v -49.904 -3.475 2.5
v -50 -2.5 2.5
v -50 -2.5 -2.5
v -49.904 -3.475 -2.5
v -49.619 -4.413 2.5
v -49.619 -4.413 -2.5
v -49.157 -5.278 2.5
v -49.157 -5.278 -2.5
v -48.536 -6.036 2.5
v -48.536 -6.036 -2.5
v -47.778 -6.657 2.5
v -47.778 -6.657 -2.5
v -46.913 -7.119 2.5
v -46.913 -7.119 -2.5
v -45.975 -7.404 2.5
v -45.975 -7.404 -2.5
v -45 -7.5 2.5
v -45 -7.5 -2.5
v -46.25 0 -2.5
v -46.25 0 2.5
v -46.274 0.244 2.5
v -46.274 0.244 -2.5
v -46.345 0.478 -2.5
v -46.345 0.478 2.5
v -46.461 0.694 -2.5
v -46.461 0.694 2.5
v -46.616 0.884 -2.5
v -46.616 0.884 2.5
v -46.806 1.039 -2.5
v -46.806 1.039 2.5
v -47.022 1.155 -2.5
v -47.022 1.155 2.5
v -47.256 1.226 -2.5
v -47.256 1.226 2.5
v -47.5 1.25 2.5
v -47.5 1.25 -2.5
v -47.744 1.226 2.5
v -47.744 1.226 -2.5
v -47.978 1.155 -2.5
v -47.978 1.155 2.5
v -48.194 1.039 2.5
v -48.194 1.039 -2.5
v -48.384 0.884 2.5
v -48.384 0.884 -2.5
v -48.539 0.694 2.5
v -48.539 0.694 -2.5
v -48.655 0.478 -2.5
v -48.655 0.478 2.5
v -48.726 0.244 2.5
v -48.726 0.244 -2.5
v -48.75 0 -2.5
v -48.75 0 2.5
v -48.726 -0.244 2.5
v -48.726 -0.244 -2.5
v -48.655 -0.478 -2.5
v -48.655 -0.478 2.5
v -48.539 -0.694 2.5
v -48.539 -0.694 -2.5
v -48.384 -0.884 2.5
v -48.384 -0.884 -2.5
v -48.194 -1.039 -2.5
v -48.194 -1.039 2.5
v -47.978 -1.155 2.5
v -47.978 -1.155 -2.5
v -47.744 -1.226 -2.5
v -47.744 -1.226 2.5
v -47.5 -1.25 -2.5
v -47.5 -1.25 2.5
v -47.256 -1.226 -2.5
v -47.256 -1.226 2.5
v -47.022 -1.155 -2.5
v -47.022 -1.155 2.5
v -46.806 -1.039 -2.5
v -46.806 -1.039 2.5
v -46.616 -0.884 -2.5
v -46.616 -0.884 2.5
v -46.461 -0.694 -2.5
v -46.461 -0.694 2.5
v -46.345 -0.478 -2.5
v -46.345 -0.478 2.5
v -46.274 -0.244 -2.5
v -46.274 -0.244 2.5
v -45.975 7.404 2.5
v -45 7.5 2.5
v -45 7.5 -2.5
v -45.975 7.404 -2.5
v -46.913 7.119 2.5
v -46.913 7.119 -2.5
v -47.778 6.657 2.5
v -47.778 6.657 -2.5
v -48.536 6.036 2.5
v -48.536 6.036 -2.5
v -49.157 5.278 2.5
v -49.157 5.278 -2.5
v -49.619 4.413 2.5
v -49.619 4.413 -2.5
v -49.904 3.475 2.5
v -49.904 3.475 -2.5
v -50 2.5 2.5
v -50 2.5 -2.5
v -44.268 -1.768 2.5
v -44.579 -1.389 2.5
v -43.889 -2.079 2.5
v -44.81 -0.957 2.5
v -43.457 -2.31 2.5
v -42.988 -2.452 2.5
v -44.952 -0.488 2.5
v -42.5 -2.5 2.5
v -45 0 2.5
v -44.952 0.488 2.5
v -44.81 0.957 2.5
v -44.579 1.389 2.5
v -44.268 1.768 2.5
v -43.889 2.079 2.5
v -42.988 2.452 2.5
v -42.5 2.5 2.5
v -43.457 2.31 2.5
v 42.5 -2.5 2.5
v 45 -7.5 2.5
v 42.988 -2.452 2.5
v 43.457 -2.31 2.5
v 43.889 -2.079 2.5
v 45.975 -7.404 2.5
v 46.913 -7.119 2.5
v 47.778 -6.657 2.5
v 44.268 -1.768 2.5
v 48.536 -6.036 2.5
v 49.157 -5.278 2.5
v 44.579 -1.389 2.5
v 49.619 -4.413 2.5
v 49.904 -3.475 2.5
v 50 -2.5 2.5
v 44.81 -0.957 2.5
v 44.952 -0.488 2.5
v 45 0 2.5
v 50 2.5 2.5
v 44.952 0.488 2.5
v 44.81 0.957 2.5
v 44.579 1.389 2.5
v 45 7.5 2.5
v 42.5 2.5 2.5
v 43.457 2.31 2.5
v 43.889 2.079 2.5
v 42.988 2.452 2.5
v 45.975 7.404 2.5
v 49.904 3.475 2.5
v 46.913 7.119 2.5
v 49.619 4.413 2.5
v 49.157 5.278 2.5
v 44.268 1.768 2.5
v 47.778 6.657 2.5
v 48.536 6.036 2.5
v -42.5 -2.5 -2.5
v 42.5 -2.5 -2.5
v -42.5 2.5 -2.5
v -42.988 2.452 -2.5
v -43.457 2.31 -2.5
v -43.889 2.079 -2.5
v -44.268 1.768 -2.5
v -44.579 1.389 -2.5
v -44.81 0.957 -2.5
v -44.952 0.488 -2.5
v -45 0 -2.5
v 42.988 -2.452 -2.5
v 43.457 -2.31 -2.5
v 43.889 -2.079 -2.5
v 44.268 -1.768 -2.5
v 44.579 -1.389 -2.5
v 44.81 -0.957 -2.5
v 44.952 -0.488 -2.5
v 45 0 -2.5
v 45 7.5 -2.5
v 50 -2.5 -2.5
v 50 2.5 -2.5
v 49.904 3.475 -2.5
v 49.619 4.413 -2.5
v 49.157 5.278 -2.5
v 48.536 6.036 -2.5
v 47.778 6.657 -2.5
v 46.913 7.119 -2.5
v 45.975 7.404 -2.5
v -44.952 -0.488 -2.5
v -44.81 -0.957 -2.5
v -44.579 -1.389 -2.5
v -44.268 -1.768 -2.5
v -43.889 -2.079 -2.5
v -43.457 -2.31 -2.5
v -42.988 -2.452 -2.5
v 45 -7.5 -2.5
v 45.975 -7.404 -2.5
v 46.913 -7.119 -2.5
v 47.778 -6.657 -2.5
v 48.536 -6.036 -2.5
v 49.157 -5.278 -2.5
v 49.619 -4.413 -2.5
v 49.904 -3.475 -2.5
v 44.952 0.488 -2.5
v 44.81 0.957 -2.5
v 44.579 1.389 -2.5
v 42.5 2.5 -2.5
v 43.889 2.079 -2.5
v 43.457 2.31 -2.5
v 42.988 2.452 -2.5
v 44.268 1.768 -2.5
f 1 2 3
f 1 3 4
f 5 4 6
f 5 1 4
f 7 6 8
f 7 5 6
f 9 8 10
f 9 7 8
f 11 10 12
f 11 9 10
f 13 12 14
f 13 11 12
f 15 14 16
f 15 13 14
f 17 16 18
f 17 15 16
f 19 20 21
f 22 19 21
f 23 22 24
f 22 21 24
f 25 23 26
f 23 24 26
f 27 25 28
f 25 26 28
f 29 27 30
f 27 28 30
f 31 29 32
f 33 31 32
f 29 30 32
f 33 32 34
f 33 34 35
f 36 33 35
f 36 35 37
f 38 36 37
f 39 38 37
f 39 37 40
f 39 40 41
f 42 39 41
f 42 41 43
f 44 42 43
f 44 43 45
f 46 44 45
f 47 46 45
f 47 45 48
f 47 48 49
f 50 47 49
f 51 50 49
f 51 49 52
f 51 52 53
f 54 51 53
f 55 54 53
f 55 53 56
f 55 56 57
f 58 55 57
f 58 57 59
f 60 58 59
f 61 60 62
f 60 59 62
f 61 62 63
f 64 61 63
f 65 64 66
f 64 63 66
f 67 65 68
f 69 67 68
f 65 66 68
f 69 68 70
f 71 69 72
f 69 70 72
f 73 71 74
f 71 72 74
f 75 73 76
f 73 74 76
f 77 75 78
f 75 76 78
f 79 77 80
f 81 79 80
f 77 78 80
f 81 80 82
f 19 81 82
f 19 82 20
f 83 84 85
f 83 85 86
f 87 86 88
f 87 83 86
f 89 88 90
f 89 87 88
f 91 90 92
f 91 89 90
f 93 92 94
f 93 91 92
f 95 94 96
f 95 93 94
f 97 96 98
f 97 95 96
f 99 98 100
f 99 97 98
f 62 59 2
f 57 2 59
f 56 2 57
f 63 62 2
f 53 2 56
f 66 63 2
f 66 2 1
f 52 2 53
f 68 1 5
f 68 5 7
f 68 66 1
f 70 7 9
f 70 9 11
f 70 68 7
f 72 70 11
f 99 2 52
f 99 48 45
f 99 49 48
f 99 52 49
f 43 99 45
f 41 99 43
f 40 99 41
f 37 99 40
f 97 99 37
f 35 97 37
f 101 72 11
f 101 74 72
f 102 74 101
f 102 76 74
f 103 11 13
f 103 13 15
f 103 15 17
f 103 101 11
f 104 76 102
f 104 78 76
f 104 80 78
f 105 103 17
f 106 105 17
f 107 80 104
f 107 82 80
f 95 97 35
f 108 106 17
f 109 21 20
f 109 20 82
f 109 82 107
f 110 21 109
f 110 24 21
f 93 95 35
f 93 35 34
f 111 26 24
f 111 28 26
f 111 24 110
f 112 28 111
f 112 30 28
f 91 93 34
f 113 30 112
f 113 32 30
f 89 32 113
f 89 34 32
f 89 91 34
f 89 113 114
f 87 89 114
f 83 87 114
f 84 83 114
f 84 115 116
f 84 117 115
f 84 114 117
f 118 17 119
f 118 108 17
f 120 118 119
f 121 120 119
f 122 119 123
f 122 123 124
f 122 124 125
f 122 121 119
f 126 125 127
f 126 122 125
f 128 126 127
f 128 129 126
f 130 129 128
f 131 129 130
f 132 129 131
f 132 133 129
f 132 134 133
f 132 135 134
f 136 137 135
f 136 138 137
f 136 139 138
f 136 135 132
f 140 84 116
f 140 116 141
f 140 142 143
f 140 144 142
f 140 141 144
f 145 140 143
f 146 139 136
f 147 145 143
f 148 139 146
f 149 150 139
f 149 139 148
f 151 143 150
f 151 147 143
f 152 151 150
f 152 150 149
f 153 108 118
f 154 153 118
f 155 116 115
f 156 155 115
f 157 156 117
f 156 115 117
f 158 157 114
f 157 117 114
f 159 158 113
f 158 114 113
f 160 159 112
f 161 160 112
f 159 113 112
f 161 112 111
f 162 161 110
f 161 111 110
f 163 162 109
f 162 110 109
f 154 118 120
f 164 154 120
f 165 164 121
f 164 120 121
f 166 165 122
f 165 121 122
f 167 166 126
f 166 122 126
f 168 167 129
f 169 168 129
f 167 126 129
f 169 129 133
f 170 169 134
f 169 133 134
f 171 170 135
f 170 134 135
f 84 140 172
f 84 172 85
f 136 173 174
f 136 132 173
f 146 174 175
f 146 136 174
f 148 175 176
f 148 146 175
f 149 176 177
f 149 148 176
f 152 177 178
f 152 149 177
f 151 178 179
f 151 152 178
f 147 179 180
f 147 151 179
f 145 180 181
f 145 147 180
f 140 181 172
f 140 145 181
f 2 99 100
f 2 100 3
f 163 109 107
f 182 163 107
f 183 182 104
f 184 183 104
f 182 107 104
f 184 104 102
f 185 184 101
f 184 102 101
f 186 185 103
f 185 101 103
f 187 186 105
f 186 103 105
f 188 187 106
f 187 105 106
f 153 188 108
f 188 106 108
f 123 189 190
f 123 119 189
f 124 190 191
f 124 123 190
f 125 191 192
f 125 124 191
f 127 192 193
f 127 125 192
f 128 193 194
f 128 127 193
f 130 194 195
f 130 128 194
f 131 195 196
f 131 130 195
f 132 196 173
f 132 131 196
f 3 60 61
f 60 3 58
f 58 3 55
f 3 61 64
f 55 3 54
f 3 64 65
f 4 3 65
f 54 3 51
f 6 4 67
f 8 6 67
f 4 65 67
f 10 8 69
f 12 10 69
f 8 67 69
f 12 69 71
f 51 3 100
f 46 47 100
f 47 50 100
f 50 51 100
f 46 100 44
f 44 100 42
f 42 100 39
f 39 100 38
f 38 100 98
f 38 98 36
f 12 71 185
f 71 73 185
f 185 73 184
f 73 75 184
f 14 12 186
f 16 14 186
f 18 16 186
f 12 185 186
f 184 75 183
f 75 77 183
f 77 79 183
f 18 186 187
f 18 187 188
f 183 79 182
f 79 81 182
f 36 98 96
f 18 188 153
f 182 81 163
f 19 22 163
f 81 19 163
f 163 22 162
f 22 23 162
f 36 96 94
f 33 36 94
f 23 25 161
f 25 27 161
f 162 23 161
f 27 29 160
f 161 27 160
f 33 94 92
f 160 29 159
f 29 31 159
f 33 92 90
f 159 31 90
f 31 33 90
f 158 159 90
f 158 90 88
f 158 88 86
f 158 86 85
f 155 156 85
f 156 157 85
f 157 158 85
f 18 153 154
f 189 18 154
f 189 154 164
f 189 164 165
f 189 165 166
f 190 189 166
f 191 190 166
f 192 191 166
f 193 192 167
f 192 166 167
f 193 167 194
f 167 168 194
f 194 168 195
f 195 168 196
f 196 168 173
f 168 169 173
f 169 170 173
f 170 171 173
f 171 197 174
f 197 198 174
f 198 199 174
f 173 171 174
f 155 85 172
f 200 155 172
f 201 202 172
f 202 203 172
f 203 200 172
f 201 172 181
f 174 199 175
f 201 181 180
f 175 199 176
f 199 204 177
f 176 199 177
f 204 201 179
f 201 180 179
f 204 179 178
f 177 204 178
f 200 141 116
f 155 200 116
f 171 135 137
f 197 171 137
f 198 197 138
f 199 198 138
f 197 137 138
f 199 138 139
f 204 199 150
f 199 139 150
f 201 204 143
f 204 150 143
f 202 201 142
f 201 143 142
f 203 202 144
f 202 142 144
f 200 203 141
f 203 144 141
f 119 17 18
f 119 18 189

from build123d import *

# Parameters (mm, degrees)
F1_DEPTH = 2.5
F3_DEPTH = 5.001
F4_R     = 1.25
F5_DEPTH = 5.001


with BuildPart() as f1:
    # F0 (on Top) → F1 (new body, symmetric)
    with BuildSketch(Plane.XY):
        with BuildLine():
            ThreePointArc((50, 2.5), (48.535534, 6.035534), (45, 7.5))
            Line((45, 7.5), (-45, 7.5))
            ThreePointArc((-45, 7.5), (-48.535534, 6.035534), (-50, 2.5))
            Line((-50, 2.5), (-50, -2.5))
            ThreePointArc((-50, -2.5), (-48.535534, -6.035534), (-45, -7.5))
            Line((-45, -7.5), (45, -7.5))
            ThreePointArc((45, -7.5), (48.535534, -6.035534), (50, -2.5))
            Line((50, -2.5), (50, 2.5))
        make_face()
    extrude(amount=F1_DEPTH, both=True)

    # F2 (on face) → F3 (cut, through all)
    with BuildSketch(Plane.XY.offset(2.5)):
        with BuildLine():
            Line((42.5, 2.5), (-42.5, 2.5))
            ThreePointArc((-42.5, 2.5), (-44.267767, 1.767767), (-45, 0))
            ThreePointArc((-45, 0), (-44.267767, -1.767767), (-42.5, -2.5))
            Line((-42.5, -2.5), (42.5, -2.5))
            ThreePointArc((42.5, -2.5), (44.267767, -1.767767), (45, 0))
            ThreePointArc((45, 0), (44.267767, 1.767767), (42.5, 2.5))
        make_face()
    extrude(amount=-F3_DEPTH, mode=Mode.SUBTRACT)

    # F4 (on face) → F5 (cut, through all)
    with BuildSketch(Plane.XY.offset(2.5)):
        with Locations((-47.5, 0)):
            Circle(F4_R)
    extrude(amount=-F5_DEPTH, mode=Mode.SUBTRACT)


solid = f1.part
